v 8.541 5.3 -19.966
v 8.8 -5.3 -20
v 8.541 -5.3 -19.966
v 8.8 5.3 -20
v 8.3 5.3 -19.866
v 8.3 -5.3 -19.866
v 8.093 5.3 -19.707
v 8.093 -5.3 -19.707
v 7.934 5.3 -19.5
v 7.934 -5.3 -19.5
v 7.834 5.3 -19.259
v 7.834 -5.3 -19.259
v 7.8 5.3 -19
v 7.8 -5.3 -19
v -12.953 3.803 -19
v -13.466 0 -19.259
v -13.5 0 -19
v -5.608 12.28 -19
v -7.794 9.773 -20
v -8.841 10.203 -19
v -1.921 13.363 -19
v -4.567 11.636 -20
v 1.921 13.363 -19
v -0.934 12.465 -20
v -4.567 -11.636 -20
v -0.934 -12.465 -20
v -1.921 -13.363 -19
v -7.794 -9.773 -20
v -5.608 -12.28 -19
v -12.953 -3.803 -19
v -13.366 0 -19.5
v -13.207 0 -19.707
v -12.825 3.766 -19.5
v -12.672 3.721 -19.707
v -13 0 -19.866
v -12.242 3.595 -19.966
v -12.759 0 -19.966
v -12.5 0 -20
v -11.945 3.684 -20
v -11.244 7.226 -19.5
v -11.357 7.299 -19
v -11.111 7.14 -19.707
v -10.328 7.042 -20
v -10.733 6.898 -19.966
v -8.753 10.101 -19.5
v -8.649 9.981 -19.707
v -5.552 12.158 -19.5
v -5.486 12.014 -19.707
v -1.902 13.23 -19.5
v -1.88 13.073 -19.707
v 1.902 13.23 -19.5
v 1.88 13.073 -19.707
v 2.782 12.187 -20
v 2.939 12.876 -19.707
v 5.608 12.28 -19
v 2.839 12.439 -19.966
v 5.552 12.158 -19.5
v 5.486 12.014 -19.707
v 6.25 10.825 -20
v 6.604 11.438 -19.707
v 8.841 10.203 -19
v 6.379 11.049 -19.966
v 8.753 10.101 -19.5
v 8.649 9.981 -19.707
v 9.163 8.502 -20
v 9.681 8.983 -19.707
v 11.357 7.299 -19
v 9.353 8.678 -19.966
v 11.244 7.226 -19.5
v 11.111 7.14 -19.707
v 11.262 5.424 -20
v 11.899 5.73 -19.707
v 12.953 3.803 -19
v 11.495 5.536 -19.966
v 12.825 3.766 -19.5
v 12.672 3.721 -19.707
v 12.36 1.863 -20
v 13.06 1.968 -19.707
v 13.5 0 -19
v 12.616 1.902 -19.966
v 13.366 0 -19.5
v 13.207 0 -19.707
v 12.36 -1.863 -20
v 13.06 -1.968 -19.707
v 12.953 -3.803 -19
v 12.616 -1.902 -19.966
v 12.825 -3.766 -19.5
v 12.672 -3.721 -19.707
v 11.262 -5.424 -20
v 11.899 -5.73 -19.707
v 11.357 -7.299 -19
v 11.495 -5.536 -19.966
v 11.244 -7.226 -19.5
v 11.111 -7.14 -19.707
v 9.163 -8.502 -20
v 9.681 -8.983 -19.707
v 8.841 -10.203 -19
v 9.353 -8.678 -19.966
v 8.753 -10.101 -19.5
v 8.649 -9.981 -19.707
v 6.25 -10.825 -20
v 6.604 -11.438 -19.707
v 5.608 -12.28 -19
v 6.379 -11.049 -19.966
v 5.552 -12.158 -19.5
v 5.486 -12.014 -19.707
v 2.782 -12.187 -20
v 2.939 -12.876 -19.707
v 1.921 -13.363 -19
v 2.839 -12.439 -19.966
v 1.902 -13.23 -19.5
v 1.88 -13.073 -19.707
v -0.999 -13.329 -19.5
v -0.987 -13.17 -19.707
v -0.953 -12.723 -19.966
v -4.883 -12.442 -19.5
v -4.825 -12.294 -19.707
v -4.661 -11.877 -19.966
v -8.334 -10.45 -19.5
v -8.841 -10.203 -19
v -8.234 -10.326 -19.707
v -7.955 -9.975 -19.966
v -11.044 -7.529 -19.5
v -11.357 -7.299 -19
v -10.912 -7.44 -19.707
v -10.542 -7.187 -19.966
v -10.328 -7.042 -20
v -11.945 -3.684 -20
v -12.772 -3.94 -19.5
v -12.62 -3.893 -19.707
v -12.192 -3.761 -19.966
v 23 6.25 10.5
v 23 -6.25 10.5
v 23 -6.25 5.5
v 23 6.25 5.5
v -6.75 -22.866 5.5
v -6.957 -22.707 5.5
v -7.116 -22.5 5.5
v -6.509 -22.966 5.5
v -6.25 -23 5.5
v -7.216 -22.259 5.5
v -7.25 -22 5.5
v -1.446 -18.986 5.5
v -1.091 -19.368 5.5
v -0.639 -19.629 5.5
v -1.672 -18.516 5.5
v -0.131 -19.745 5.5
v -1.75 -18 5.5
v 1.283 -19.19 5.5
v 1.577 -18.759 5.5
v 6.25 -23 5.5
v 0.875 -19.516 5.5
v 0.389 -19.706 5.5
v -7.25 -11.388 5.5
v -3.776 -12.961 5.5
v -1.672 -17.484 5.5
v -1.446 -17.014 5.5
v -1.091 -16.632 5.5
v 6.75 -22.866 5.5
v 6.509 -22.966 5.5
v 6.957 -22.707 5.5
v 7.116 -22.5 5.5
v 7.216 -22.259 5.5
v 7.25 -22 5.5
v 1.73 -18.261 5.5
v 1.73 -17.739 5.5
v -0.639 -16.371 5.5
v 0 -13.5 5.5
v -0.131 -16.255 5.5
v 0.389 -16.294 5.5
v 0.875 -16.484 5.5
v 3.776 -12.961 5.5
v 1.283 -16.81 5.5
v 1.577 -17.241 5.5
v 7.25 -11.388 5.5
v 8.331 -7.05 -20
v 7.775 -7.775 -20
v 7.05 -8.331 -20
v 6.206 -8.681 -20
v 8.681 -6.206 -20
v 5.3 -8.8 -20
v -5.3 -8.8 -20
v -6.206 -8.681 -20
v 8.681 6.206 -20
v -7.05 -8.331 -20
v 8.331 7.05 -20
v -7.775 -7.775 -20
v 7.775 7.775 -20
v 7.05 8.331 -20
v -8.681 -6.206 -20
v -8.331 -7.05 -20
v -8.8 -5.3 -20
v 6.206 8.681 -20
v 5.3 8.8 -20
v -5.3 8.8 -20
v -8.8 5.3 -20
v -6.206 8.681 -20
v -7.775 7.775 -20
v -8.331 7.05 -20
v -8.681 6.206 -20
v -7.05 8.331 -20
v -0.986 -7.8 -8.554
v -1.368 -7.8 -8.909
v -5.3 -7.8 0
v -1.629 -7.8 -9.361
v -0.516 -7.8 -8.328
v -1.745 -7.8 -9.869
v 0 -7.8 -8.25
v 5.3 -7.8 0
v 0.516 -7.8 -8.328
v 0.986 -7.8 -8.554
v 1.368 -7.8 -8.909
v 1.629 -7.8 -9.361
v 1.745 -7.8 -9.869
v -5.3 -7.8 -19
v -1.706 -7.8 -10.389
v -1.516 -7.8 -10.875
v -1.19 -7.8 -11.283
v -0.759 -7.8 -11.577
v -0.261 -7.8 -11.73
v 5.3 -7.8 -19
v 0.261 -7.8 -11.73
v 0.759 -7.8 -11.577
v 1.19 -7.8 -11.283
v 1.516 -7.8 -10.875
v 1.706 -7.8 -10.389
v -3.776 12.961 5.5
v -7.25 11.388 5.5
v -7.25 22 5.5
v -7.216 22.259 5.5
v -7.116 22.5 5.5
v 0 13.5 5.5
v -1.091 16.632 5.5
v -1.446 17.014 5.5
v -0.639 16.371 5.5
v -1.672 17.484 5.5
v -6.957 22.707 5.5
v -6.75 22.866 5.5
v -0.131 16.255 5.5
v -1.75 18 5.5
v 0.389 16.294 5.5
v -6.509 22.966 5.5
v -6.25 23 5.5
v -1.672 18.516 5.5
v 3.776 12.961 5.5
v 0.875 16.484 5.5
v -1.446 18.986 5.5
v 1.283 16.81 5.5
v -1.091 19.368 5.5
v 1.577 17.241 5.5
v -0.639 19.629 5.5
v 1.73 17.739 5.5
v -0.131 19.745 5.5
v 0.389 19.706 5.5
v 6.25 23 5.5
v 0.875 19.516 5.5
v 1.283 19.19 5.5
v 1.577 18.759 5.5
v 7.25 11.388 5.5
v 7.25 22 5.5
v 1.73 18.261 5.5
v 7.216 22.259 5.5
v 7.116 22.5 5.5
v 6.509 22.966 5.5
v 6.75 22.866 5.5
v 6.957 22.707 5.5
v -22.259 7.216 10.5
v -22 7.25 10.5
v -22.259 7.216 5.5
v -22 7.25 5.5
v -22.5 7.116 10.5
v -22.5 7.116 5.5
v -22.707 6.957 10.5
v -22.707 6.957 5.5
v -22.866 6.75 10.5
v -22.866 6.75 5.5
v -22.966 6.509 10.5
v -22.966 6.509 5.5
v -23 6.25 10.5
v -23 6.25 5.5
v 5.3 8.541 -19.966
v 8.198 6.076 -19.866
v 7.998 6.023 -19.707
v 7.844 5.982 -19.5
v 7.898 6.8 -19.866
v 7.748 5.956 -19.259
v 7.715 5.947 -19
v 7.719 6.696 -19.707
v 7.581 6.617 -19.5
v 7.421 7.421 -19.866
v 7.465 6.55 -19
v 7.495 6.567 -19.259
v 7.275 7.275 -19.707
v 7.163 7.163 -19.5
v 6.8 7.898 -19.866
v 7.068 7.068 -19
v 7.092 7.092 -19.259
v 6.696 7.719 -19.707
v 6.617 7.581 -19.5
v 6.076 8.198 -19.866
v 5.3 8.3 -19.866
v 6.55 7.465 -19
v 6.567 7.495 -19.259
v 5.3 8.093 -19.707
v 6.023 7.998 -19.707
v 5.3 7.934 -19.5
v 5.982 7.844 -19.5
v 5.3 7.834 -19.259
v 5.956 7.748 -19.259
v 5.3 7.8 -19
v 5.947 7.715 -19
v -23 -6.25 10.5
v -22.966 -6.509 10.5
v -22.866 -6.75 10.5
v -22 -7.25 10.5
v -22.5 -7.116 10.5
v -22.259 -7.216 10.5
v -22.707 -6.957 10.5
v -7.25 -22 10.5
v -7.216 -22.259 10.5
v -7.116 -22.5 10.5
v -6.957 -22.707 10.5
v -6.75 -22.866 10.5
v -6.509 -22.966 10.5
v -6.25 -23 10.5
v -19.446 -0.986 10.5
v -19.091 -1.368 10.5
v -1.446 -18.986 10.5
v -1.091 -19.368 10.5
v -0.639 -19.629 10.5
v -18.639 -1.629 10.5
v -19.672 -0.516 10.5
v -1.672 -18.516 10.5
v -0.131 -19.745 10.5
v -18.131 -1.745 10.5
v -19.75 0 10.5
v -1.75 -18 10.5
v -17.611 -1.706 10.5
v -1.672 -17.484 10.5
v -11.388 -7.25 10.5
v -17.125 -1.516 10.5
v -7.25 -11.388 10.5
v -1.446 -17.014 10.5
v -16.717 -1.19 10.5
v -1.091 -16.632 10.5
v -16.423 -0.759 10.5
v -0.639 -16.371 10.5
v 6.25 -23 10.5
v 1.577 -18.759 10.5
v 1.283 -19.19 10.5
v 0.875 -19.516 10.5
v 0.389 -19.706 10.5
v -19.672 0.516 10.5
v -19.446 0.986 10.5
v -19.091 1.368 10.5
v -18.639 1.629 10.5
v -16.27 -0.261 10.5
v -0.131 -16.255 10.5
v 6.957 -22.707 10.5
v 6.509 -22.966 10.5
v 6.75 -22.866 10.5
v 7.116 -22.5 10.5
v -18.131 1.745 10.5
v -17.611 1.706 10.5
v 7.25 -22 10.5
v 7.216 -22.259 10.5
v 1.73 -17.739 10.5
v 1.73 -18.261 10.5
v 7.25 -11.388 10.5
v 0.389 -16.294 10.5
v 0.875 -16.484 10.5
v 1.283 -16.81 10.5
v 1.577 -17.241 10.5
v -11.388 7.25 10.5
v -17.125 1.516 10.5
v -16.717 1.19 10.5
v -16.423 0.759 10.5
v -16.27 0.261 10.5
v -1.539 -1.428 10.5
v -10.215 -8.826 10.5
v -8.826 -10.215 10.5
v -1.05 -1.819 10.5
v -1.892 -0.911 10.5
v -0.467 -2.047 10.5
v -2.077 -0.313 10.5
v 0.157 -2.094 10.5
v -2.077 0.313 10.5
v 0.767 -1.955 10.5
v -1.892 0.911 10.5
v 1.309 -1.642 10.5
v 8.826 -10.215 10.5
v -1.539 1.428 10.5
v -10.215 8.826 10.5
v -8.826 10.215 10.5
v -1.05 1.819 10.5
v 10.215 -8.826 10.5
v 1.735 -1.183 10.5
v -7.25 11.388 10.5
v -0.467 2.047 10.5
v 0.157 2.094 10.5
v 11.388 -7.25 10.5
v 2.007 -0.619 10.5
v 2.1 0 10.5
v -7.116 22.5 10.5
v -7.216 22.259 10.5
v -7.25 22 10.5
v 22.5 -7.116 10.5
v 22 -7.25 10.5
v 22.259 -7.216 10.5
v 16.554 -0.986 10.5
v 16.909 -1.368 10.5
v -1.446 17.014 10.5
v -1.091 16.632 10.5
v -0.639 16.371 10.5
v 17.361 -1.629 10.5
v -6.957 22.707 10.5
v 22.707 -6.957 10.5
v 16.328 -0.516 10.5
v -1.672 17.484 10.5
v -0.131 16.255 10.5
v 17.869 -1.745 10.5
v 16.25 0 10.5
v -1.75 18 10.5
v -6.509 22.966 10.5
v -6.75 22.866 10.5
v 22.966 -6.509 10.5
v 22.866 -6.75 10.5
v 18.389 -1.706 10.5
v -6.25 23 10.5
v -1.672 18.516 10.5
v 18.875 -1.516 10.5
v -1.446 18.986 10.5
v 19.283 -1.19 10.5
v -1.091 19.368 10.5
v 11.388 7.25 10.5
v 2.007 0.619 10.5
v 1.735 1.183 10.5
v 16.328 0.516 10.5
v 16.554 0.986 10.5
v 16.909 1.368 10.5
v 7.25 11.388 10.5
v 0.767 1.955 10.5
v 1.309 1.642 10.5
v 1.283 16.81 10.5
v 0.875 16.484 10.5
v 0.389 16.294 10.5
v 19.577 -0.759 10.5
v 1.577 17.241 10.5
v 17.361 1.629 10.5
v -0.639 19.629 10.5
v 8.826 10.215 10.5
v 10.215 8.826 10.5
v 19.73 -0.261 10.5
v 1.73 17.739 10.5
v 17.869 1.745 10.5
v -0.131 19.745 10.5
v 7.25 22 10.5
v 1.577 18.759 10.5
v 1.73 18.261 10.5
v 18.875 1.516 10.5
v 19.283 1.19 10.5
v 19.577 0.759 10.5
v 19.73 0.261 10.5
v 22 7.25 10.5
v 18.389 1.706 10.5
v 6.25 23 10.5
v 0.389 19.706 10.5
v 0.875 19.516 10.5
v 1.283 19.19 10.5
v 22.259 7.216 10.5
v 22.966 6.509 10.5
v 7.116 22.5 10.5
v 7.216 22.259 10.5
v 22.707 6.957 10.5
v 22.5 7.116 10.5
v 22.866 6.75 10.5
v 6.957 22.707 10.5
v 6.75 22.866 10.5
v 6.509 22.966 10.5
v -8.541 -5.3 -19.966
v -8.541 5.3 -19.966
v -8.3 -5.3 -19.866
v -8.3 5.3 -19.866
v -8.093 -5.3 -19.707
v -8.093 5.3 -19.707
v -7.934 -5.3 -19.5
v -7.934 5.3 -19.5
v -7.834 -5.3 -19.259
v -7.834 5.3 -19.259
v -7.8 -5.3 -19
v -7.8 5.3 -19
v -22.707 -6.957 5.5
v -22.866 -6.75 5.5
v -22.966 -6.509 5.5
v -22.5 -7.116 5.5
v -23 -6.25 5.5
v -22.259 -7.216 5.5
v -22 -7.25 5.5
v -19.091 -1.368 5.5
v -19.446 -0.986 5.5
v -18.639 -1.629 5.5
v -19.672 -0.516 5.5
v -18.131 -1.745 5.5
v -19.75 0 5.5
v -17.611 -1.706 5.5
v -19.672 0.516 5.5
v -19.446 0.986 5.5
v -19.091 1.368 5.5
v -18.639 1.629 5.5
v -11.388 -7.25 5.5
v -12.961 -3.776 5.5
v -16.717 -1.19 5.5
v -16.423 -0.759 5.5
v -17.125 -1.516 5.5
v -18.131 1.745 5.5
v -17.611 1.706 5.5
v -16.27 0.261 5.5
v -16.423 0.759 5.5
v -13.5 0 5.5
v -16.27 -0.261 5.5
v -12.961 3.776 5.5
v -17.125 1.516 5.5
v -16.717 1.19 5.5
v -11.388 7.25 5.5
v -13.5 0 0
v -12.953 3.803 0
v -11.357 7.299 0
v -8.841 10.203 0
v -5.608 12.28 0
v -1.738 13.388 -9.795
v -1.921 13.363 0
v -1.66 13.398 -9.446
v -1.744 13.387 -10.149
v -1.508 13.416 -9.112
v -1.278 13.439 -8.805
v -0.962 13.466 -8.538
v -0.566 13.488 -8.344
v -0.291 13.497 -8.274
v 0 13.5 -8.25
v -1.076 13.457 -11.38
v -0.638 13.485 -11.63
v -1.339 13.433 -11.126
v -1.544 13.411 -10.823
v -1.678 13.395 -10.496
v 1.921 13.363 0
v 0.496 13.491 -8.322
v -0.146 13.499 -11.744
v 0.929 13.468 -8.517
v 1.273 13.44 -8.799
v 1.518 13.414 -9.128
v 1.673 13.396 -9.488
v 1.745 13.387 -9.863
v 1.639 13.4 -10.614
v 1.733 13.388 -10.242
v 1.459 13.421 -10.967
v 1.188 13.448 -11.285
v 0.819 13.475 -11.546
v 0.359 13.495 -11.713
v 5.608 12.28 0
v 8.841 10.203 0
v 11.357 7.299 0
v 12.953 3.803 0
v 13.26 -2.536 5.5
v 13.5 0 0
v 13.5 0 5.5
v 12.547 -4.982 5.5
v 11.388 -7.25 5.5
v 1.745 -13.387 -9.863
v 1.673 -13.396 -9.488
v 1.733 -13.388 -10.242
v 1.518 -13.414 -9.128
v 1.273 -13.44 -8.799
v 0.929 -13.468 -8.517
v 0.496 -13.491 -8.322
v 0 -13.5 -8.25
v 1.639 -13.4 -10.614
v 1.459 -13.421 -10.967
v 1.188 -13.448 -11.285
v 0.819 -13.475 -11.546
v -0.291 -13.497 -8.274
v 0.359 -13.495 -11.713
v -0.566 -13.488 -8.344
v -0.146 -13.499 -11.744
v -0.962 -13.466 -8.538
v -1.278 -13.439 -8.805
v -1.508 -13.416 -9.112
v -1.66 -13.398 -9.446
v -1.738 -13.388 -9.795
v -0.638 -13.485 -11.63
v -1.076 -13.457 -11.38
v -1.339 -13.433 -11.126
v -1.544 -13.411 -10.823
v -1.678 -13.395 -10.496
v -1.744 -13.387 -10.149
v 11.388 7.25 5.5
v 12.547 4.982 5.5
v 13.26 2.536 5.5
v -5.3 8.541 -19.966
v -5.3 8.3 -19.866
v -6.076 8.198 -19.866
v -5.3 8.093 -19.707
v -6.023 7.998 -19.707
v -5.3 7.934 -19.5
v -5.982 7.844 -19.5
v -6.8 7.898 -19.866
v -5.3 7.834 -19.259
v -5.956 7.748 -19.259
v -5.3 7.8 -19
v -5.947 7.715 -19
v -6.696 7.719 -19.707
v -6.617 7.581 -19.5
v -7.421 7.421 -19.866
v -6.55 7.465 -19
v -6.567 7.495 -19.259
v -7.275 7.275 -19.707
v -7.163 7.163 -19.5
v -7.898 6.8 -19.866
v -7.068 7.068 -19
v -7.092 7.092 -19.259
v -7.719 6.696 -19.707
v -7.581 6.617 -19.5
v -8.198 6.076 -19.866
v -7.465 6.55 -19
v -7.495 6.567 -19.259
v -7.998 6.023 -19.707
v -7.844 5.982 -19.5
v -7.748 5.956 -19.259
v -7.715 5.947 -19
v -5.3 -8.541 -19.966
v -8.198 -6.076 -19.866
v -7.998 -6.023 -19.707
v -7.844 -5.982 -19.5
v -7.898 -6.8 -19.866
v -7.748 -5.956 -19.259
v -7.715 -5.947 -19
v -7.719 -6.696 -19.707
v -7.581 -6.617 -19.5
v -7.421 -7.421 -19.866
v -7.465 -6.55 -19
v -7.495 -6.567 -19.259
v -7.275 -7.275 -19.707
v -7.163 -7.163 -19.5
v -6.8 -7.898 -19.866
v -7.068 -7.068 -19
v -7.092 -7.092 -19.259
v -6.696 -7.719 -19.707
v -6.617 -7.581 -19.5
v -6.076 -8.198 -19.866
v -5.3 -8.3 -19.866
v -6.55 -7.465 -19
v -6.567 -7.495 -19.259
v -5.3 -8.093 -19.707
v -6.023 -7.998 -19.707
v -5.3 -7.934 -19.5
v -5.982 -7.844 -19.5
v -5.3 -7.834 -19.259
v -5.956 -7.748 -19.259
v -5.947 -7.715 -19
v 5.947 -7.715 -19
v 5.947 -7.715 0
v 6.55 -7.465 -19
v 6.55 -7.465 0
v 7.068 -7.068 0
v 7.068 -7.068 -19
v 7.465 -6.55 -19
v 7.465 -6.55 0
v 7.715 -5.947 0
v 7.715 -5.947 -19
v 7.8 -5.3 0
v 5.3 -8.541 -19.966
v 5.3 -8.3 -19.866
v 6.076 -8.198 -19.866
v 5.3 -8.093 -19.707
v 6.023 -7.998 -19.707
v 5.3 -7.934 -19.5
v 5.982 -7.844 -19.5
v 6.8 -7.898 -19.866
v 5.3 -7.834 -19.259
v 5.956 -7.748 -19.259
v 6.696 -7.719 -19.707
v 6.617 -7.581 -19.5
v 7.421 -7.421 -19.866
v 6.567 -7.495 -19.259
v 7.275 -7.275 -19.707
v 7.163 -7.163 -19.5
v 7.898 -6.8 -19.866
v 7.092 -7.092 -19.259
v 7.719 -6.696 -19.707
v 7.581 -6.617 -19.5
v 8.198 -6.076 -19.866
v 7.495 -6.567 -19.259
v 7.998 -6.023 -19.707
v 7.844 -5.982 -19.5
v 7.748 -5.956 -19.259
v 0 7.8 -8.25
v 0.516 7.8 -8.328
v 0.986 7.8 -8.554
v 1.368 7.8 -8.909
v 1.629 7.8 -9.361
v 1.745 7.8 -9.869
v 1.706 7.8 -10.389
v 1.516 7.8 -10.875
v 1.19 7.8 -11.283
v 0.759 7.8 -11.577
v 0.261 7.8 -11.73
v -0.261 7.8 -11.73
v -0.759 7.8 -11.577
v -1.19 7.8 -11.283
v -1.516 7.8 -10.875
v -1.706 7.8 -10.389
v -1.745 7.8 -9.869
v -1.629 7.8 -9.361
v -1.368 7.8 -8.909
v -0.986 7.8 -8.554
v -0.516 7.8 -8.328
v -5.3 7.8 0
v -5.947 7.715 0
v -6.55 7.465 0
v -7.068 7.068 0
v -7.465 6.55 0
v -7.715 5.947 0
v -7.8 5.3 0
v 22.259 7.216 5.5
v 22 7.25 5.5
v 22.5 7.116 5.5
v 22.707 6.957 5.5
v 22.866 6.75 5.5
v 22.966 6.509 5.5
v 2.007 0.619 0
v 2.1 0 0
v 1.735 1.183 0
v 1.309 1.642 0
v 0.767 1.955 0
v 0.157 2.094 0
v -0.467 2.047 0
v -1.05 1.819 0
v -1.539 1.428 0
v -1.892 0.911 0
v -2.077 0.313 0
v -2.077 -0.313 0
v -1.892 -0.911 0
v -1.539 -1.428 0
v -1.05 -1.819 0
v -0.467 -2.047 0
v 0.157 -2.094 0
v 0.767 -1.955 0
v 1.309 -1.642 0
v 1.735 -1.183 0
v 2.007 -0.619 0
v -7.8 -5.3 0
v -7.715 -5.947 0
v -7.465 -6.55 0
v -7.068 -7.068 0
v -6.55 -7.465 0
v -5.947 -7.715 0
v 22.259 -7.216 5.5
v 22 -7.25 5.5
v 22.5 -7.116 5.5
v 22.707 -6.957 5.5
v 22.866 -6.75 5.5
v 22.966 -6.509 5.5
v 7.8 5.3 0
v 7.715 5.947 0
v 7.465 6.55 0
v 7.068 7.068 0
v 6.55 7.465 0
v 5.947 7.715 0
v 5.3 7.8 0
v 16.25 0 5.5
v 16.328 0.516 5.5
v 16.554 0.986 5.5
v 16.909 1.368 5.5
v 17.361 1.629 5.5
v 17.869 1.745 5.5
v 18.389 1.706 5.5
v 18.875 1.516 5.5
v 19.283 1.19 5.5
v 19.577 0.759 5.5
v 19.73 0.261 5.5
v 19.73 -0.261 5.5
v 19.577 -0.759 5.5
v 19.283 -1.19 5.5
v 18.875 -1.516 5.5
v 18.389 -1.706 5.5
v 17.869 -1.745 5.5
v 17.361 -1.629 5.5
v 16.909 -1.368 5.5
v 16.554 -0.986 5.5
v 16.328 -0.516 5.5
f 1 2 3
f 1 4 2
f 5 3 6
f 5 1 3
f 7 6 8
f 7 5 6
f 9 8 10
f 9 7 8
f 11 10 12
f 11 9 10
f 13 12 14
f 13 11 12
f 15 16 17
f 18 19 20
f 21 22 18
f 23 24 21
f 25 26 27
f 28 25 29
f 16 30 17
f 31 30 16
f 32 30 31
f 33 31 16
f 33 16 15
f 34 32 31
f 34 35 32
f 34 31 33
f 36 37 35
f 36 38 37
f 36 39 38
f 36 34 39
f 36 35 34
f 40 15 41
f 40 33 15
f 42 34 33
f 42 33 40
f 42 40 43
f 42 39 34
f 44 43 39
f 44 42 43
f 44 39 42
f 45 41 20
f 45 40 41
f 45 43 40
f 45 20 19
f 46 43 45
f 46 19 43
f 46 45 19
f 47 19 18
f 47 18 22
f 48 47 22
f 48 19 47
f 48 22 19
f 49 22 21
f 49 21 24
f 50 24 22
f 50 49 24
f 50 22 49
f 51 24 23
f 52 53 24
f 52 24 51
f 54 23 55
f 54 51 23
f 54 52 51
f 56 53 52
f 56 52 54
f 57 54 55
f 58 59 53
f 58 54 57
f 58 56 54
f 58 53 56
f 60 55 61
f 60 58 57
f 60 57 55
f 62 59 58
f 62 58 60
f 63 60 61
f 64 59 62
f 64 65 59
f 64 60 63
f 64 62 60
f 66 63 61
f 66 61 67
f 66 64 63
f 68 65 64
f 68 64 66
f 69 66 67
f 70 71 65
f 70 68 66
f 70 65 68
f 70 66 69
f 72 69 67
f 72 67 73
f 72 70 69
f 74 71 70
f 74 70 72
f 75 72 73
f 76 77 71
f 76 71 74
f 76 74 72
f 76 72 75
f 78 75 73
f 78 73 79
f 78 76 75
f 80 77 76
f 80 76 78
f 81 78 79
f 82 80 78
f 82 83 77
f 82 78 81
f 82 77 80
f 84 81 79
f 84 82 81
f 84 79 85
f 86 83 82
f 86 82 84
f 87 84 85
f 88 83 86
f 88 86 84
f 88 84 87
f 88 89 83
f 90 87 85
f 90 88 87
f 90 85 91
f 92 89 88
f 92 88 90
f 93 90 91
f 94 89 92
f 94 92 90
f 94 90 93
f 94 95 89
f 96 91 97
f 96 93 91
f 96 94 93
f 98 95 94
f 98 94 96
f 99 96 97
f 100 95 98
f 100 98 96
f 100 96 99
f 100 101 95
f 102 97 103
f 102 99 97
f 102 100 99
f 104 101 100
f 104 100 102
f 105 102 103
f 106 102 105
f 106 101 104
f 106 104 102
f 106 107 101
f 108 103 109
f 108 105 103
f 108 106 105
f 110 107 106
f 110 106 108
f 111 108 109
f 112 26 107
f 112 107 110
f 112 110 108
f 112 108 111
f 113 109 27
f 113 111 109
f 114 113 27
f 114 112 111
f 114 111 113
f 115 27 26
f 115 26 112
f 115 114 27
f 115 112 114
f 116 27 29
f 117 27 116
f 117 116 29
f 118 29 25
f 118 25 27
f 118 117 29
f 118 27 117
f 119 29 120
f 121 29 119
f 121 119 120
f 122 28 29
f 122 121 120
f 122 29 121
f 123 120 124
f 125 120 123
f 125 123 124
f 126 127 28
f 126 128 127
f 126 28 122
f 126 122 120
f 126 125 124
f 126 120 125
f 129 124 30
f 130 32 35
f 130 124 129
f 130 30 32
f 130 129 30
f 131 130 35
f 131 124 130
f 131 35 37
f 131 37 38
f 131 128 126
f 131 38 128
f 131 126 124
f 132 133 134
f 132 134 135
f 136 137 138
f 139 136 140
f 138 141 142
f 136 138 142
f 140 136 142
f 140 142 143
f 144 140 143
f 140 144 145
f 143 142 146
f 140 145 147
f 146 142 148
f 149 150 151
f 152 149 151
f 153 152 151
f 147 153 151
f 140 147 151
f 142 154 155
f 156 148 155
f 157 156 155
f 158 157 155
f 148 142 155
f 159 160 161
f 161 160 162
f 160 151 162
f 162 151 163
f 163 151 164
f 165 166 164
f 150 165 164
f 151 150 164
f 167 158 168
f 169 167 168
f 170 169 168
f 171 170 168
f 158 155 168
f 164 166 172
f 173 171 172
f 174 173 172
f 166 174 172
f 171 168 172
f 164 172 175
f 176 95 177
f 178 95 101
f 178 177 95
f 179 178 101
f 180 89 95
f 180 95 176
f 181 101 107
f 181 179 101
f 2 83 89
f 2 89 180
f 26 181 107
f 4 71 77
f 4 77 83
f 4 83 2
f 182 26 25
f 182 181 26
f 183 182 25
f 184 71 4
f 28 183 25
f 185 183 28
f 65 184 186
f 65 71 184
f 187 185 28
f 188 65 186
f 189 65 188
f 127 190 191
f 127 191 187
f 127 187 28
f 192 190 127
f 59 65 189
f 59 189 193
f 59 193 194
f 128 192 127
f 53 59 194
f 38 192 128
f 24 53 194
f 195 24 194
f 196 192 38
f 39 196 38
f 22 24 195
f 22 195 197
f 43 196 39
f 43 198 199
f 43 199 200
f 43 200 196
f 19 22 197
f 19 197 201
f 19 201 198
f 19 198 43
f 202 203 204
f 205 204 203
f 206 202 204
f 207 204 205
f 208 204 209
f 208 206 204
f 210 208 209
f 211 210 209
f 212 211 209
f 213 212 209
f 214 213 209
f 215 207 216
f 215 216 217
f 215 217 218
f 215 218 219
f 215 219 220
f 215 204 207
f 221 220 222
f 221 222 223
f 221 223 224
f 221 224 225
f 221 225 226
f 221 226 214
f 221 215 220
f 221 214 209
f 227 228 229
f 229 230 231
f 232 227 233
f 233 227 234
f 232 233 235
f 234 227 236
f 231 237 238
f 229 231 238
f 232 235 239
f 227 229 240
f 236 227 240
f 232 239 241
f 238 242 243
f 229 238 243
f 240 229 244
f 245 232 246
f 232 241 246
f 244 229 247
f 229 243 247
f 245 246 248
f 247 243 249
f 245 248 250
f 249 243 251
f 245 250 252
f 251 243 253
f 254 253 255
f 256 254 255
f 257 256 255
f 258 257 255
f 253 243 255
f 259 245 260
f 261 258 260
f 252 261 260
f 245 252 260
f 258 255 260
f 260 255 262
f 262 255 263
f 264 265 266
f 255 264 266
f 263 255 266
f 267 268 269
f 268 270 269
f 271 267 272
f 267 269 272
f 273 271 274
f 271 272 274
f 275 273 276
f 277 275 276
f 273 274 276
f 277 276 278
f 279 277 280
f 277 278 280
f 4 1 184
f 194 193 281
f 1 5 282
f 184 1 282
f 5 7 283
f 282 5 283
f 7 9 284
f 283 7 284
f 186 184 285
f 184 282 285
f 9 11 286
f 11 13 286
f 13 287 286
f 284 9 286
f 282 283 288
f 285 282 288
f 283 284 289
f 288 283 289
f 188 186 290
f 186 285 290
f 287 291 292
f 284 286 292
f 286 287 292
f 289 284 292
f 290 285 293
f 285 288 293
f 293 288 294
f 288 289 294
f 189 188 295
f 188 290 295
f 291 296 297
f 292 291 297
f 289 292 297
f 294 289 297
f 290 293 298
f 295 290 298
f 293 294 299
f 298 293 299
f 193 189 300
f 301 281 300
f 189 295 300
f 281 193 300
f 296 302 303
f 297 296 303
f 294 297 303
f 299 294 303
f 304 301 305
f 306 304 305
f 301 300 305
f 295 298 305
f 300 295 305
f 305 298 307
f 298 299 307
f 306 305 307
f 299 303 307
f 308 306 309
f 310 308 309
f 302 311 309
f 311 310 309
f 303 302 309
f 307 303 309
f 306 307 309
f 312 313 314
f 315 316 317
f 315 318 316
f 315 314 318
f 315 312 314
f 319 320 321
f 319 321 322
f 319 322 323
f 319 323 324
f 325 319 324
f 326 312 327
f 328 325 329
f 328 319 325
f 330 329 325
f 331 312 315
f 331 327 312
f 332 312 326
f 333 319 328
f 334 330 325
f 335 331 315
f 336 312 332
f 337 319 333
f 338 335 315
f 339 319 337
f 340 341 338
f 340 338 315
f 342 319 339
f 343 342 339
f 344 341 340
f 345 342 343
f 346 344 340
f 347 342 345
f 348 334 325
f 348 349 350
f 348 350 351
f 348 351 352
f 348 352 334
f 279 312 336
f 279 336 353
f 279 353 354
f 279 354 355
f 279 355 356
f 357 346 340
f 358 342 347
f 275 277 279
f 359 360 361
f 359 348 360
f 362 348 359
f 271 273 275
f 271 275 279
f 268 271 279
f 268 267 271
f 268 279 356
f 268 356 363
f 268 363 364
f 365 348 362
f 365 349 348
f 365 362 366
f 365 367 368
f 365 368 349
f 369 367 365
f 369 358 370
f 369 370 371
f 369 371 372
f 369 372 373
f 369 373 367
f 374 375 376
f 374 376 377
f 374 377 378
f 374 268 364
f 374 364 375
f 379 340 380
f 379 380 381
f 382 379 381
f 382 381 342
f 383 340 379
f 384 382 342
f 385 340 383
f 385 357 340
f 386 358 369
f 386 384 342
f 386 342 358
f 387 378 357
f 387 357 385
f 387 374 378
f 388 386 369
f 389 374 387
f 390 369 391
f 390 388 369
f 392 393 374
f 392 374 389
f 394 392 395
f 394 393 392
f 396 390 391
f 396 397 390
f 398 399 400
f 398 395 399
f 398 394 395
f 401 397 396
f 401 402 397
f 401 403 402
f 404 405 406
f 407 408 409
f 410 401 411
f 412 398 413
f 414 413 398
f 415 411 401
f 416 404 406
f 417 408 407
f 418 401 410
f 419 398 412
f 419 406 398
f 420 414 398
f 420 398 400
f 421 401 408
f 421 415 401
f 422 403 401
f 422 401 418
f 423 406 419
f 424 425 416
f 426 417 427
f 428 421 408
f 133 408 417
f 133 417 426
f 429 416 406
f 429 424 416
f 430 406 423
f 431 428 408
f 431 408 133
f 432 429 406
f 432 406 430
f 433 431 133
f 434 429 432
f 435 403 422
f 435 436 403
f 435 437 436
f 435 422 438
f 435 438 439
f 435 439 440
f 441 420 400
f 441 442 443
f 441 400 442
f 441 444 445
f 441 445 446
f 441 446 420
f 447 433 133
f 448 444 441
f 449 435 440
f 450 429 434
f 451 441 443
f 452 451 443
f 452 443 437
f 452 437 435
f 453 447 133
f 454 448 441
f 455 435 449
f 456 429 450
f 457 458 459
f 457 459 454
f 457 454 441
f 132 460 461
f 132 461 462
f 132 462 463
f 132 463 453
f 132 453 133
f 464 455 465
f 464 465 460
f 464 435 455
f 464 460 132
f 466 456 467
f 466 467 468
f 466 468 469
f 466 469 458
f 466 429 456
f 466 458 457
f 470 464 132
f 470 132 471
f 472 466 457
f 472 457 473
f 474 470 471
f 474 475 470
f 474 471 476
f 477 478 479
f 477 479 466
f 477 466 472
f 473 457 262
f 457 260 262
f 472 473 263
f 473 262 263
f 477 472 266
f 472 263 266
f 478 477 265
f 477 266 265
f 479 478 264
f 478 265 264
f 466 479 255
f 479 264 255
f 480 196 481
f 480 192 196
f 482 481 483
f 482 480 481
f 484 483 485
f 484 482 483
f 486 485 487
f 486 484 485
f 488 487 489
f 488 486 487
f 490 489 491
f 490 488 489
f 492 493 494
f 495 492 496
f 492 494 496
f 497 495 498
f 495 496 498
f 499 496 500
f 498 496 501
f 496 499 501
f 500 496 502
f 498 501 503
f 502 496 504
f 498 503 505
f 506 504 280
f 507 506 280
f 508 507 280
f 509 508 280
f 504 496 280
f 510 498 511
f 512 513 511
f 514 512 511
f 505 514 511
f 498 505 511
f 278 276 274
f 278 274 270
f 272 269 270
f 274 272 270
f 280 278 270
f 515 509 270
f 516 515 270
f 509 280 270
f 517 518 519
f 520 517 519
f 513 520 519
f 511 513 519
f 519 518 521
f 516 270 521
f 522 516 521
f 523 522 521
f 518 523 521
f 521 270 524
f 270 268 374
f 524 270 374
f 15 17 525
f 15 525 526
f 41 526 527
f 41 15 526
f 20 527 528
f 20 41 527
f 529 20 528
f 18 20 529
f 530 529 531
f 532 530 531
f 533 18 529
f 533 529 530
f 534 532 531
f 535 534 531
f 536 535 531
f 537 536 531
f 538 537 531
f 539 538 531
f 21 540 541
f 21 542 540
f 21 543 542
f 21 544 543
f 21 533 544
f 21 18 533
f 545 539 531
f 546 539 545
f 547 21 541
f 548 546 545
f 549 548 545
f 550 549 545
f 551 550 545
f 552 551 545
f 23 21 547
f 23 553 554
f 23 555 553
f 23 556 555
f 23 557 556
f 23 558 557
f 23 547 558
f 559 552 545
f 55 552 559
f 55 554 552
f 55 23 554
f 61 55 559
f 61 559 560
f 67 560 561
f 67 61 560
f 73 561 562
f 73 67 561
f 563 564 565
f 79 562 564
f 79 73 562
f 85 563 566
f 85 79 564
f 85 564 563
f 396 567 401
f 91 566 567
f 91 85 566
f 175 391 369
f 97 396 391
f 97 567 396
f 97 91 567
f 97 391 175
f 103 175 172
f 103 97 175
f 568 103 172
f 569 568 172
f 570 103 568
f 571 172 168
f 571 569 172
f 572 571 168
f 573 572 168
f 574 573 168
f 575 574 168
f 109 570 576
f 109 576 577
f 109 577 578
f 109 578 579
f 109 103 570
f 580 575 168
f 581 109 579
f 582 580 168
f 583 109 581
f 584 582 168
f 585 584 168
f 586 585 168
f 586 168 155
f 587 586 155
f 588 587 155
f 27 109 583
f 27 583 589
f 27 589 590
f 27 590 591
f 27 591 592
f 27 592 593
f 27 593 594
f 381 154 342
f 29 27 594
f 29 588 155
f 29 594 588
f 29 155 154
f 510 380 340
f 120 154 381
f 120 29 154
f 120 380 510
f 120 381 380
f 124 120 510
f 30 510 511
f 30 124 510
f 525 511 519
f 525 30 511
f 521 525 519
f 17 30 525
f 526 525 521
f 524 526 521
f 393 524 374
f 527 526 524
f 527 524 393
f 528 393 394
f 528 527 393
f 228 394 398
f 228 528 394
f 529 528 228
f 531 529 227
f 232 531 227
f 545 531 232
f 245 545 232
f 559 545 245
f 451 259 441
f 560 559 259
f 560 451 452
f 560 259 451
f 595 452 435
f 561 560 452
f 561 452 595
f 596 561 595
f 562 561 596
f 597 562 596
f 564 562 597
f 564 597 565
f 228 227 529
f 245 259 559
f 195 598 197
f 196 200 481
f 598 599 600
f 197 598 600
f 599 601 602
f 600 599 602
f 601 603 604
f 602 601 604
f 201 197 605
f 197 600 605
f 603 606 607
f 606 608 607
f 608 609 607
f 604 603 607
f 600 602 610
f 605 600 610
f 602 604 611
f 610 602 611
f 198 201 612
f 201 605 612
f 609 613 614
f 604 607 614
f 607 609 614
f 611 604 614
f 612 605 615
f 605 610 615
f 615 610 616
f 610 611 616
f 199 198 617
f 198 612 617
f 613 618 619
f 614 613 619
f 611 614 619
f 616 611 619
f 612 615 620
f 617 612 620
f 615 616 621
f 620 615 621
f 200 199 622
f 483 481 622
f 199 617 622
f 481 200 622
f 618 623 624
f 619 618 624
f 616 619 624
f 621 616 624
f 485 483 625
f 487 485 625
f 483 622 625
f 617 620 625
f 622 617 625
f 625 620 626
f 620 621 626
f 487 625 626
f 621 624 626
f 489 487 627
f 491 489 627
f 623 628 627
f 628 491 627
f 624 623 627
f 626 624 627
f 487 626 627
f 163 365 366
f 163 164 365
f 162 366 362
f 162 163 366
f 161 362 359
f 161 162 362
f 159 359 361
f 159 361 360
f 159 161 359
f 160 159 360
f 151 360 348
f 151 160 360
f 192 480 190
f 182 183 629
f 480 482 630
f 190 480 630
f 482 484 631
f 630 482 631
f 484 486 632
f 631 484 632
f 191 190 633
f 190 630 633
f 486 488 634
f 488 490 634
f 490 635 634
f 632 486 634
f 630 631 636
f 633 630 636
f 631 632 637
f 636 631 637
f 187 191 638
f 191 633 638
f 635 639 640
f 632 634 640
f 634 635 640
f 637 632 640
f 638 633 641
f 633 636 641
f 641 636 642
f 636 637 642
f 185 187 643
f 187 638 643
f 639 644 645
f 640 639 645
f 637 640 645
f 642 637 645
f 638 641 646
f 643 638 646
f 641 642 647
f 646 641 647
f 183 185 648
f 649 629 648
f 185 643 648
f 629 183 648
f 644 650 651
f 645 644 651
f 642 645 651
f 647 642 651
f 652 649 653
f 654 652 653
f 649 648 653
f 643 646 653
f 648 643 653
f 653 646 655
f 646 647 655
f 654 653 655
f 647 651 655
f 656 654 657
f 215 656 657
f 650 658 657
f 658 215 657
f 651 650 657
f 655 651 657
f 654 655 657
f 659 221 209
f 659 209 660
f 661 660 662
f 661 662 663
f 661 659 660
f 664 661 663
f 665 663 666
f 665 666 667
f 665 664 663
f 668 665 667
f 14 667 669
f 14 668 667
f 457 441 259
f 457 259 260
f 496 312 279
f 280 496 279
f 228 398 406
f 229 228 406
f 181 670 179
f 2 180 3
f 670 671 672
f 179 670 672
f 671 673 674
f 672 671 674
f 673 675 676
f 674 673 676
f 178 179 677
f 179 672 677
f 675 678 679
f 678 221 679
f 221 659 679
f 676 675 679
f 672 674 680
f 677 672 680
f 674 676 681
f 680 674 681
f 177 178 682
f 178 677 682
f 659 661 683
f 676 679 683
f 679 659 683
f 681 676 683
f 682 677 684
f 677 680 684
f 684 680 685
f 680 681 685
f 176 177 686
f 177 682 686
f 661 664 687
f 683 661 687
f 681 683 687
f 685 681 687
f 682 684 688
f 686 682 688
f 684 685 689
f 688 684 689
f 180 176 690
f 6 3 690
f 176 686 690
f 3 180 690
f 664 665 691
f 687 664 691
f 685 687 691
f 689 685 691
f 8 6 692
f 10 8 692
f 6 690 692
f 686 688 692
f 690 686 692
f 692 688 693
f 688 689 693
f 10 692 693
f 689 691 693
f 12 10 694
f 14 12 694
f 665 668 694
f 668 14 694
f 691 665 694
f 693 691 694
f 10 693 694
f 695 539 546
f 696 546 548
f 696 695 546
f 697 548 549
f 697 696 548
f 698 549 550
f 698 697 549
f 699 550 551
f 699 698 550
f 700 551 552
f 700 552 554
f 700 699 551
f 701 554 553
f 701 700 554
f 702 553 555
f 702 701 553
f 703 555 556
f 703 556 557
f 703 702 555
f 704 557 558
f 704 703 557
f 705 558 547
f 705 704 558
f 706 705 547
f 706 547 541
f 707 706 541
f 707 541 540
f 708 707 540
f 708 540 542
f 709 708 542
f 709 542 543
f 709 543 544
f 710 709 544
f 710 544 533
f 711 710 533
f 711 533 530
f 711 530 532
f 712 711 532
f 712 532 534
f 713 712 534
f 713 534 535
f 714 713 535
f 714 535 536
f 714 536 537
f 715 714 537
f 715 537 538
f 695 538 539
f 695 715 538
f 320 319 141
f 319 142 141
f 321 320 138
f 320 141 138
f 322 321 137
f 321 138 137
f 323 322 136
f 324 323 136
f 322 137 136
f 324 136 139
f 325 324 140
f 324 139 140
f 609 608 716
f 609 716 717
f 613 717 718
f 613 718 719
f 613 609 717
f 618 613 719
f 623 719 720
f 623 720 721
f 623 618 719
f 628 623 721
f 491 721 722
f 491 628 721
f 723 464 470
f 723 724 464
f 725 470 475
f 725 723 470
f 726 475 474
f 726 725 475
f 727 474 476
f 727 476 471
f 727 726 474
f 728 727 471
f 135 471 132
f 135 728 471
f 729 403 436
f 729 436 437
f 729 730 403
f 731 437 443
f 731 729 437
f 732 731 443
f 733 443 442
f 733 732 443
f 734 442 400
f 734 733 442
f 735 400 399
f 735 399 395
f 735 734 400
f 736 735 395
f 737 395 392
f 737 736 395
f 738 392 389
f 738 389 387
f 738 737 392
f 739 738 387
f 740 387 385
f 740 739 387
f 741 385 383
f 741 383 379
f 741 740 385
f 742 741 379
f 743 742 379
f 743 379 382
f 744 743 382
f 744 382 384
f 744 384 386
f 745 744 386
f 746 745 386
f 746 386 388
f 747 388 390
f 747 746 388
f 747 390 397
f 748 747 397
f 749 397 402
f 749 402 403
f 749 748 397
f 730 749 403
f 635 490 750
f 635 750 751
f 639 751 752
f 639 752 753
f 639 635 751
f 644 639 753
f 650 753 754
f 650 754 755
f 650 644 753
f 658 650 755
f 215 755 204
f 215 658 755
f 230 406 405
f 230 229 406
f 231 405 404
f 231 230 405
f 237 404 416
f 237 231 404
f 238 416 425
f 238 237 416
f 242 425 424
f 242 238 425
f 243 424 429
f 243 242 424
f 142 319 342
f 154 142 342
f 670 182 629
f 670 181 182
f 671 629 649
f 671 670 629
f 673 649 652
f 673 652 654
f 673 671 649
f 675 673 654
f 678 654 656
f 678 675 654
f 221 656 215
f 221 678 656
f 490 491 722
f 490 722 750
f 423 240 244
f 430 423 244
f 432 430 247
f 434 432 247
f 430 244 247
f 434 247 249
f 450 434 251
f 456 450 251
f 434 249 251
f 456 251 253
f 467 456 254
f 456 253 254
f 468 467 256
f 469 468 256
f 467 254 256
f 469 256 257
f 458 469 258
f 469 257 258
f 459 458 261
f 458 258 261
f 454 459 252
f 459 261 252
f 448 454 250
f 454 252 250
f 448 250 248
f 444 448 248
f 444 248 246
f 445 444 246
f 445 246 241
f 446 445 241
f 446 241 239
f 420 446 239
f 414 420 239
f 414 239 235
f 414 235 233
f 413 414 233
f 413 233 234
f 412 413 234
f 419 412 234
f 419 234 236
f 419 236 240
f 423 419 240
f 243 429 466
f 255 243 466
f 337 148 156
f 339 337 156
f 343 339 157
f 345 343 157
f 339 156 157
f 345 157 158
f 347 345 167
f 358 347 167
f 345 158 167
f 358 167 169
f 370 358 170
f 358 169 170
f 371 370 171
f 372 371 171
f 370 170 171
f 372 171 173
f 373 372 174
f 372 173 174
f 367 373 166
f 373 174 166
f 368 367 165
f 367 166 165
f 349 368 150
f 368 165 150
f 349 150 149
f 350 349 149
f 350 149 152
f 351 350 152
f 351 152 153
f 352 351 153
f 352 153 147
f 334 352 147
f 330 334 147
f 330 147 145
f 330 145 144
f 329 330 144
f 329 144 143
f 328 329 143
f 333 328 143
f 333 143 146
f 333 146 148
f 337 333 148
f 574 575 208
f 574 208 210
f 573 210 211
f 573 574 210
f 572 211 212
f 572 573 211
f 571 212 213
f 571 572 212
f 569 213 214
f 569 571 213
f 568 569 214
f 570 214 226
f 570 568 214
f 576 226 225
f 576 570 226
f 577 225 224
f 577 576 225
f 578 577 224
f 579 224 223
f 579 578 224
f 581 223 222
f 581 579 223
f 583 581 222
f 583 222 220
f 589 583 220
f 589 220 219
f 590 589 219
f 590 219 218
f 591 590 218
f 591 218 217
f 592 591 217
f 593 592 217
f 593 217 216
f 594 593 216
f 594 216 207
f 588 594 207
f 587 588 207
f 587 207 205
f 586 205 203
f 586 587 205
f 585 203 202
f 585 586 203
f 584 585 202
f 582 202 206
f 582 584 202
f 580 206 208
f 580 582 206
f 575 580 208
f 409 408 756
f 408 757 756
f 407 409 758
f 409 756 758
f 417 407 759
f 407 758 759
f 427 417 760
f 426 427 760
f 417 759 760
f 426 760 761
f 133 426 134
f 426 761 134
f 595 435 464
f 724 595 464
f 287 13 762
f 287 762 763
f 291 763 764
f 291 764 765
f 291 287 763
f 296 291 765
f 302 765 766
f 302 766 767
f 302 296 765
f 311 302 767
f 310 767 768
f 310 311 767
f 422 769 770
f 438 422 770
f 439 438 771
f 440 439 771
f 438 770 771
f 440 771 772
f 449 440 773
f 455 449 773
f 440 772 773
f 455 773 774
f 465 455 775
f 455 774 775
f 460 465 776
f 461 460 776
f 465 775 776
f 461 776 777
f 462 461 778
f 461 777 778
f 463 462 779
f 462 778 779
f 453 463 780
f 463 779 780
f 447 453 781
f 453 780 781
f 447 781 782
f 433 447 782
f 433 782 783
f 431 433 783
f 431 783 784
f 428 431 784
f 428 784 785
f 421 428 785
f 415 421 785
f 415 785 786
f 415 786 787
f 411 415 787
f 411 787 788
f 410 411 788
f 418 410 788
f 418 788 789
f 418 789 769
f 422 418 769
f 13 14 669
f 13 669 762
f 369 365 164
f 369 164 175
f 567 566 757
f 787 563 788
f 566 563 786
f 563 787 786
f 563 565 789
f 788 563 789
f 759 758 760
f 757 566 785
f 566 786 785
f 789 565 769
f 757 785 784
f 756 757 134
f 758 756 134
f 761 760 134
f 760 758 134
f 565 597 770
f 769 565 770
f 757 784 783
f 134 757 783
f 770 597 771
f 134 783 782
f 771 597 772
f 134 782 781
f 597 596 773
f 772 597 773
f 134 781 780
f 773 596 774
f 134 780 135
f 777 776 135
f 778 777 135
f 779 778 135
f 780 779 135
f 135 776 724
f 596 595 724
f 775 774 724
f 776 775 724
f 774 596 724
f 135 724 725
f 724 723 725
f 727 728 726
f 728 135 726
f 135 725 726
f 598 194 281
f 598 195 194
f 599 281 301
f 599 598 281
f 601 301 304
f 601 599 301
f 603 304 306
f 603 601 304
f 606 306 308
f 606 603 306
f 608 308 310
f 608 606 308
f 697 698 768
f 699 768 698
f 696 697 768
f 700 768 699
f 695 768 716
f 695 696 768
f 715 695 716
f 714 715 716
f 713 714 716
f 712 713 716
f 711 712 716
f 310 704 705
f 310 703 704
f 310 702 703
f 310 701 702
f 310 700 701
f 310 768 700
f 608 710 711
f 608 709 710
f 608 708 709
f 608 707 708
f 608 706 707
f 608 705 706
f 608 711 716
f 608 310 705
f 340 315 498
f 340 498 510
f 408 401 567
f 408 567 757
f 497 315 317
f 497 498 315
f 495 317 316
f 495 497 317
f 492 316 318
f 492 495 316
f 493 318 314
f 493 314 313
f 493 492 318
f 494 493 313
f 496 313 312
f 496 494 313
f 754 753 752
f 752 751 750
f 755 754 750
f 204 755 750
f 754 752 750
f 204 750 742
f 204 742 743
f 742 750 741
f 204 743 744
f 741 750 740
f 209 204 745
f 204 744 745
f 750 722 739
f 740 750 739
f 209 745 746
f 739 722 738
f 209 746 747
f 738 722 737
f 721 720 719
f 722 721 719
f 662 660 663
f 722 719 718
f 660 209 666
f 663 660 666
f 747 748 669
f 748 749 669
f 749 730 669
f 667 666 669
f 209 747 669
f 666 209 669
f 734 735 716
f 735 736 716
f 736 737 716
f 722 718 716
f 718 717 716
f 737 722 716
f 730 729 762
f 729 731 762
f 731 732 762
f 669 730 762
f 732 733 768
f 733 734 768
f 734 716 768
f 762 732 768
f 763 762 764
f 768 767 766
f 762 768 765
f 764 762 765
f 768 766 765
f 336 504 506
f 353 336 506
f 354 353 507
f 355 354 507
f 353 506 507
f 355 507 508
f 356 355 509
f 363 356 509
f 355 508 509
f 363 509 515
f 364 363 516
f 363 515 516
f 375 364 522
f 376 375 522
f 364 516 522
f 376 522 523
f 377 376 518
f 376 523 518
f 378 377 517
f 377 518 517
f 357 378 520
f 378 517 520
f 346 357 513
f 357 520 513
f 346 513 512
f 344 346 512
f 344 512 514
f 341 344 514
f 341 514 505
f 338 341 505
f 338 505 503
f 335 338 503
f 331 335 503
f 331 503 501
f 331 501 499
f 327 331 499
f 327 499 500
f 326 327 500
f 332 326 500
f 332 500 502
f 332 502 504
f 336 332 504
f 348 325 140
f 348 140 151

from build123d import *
from build123d.topology import SkipClean

# Parameters (mm, degrees)
SKETCH1_R               = 13.5
SKETCH1_R_2             = 2.1
BOSS_EXTRUDE1_DEPTH     = 5.5
SKETCH2_R               = 13.5
SKETCH2_R_2             = 2.1
BOSS_EXTRUDE2_DEPTH     = 5
SKETCH4_W               = 14.5
SKETCH4_H               = 15
SKETCH4_W_2             = 15
SKETCH4_H_2             = 14.5
BOSS_EXTRUDE4_DEPTH     = 5
CUT_EXTRUDE1_REACH      = 34.989
SKETCH5_R               = 1.75
BOSS_EXTRUDE5_START     = 20
SKETCH6_R               = 13.5
BOSS_EXTRUDE5_DEPTH     = 20
CUT_EXTRUDE2_DEPTH      = 39.183766184
CUT_EXTRUDE2_DEPTH_BACK = 39.183766184
SKETCH7_R               = 1.75
FILLET5_R               = 1
FILLET6_R               = 1


with BuildPart() as part:
    # Sketch1 → Boss-Extrude1 (new body)
    with BuildSketch(Plane.XY):
        Circle(SKETCH1_R)
        Circle(SKETCH1_R_2, mode=Mode.SUBTRACT)
    extrude(amount=BOSS_EXTRUDE1_DEPTH)

    # Sketch2 → Boss-Extrude2 (add)
    with BuildSketch(Plane.XY.offset(5.5)):
        Circle(SKETCH2_R)
        Circle(SKETCH2_R_2, mode=Mode.SUBTRACT)
    extrude(amount=BOSS_EXTRUDE2_DEPTH)

    # Sketch4 → Boss-Extrude4 (add)
    with BuildSketch(Plane.XY.offset(10.5)):
        with Locations((0, 15.5)):
            Rectangle(SKETCH4_W, SKETCH4_H)
        with Locations((15.5, 0)):
            Rectangle(SKETCH4_W_2, SKETCH4_H_2)
        with Locations((-15.5, 0)):
            Rectangle(SKETCH4_W_2, SKETCH4_H_2)
        with Locations((0, -15.5)):
            Rectangle(SKETCH4_W, SKETCH4_H)
    extrude(amount=-BOSS_EXTRUDE4_DEPTH)

    # Sketch5 → Cut-Extrude1 (cut, up to next)
    with BuildSketch(Plane(origin=(0, 0, 5.5), x_dir=(-1, 0, 0), z_dir=(0, 0, -1)), mode=Mode.PRIVATE) as cut_extrude1_sk1:
        with Locations((18, 0)):
            Circle(SKETCH5_R)
    cut_extrude1_tool1 = extrude(cut_extrude1_sk1.sketch, amount=-CUT_EXTRUDE1_REACH, mode=Mode.PRIVATE) & part.part
    # Sketch5 → Cut-Extrude1 (cut, up to next)
    with BuildSketch(Plane(origin=(0, 0, 5.5), x_dir=(-1, 0, 0), z_dir=(0, 0, -1)), mode=Mode.PRIVATE) as cut_extrude1_sk2:
        with Locations((-18, 0)):
            Circle(SKETCH5_R)
    cut_extrude1_tool2 = extrude(cut_extrude1_sk2.sketch, amount=-CUT_EXTRUDE1_REACH, mode=Mode.PRIVATE) & part.part
    # Sketch5 → Cut-Extrude1 (cut, up to next)
    with BuildSketch(Plane(origin=(0, 0, 5.5), x_dir=(-1, 0, 0), z_dir=(0, 0, -1)), mode=Mode.PRIVATE) as cut_extrude1_sk3:
        with Locations((0, 18)):
            Circle(SKETCH5_R)
    cut_extrude1_tool3 = extrude(cut_extrude1_sk3.sketch, amount=-CUT_EXTRUDE1_REACH, mode=Mode.PRIVATE) & part.part
    # Sketch5 → Cut-Extrude1 (cut, up to next)
    with BuildSketch(Plane(origin=(0, 0, 5.5), x_dir=(-1, 0, 0), z_dir=(0, 0, -1)), mode=Mode.PRIVATE) as cut_extrude1_sk4:
        with Locations((0, -18)):
            Circle(SKETCH5_R)
    cut_extrude1_tool4 = extrude(cut_extrude1_sk4.sketch, amount=-CUT_EXTRUDE1_REACH, mode=Mode.PRIVATE) & part.part
    add(cut_extrude1_tool1.solids().sort_by_distance((-18, 0, 5.5))[0], mode=Mode.SUBTRACT)
    add(cut_extrude1_tool2.solids().sort_by_distance((18, 0, 5.5))[0], mode=Mode.SUBTRACT)
    add(cut_extrude1_tool3.solids().sort_by_distance((0, 18, 5.5))[0], mode=Mode.SUBTRACT)
    add(cut_extrude1_tool4.solids().sort_by_distance((0, -18, 5.5))[0], mode=Mode.SUBTRACT)

    # Sketch6 → Boss-Extrude5 (add)
    with SkipClean():  # the faces are left unmerged after this step: merging them gives an invalid solid
        with BuildSketch(Plane(origin=(0, 0, 0), x_dir=(-1, 0, 0), z_dir=(0, 0, -1)).offset(BOSS_EXTRUDE5_START)):
            Circle(SKETCH6_R)
            with BuildLine():
                Line((-5.3, 7.8), (5.3, 7.8))
                ThreePointArc((5.3, 7.8), (7.067766953, 7.067766953), (7.8, 5.3))
                Line((7.8, 5.3), (7.8, -5.3))
                ThreePointArc((7.8, -5.3), (7.067766953, -7.067766953), (5.3, -7.8))
                Line((5.3, -7.8), (-5.3, -7.8))
                ThreePointArc((-5.3, -7.8), (-7.067766953, -7.067766953), (-7.8, -5.3))
                Line((-7.8, -5.3), (-7.8, 5.3))
                ThreePointArc((-7.8, 5.3), (-7.067766953, 7.067766953), (-5.3, 7.8))
            make_face(mode=Mode.SUBTRACT)
        extrude(amount=-BOSS_EXTRUDE5_DEPTH)

    # Sketch7 → Cut-Extrude2 (cut, two sides: drawn at the far end of the back side and taken through both)
    with SkipClean():  # the faces are left unmerged after this step: merging them gives an invalid solid
        with BuildSketch(Plane(origin=(0, 0, 0), x_dir=(1, 0, 0), z_dir=(0, 1, 0)).offset(-CUT_EXTRUDE2_DEPTH_BACK)):
            with Locations((0, 10)):
                Circle(SKETCH7_R)
        extrude(amount=CUT_EXTRUDE2_DEPTH + CUT_EXTRUDE2_DEPTH_BACK, mode=Mode.SUBTRACT)

    # Fillet5
    fillet5_edges = [part.edges().sort_by_distance(p)[0] for p in [
        (7.067766953, 7.067766953, -20),
        (0, 7.8, -20),
        (-7.067766953, 7.067766953, -20),
        (-7.8, 0, -20),
        (-7.067766953, -7.067766953, -20),
        (0, -7.8, -20),
        (7.067766953, -7.067766953, -20),
        (7.8, 0, -20),
        (13.5, 0, -20),
    ]]
    fillet(fillet5_edges, radius=FILLET5_R)

    # Fillet6
    fillet6_edges = [part.edges().sort_by_distance(p)[0] for p in [
        (-23, 7.25, 8),
        (-23, -7.25, 8),
        (-7.25, -23, 8),
        (7.25, -23, 8),
        (23, -7.25, 8),
        (-7.25, 23, 8),
        (7.25, 23, 8),
        (23, 7.25, 8),
    ]]
    fillet(fillet6_edges, radius=FILLET6_R)


solid = part.part
